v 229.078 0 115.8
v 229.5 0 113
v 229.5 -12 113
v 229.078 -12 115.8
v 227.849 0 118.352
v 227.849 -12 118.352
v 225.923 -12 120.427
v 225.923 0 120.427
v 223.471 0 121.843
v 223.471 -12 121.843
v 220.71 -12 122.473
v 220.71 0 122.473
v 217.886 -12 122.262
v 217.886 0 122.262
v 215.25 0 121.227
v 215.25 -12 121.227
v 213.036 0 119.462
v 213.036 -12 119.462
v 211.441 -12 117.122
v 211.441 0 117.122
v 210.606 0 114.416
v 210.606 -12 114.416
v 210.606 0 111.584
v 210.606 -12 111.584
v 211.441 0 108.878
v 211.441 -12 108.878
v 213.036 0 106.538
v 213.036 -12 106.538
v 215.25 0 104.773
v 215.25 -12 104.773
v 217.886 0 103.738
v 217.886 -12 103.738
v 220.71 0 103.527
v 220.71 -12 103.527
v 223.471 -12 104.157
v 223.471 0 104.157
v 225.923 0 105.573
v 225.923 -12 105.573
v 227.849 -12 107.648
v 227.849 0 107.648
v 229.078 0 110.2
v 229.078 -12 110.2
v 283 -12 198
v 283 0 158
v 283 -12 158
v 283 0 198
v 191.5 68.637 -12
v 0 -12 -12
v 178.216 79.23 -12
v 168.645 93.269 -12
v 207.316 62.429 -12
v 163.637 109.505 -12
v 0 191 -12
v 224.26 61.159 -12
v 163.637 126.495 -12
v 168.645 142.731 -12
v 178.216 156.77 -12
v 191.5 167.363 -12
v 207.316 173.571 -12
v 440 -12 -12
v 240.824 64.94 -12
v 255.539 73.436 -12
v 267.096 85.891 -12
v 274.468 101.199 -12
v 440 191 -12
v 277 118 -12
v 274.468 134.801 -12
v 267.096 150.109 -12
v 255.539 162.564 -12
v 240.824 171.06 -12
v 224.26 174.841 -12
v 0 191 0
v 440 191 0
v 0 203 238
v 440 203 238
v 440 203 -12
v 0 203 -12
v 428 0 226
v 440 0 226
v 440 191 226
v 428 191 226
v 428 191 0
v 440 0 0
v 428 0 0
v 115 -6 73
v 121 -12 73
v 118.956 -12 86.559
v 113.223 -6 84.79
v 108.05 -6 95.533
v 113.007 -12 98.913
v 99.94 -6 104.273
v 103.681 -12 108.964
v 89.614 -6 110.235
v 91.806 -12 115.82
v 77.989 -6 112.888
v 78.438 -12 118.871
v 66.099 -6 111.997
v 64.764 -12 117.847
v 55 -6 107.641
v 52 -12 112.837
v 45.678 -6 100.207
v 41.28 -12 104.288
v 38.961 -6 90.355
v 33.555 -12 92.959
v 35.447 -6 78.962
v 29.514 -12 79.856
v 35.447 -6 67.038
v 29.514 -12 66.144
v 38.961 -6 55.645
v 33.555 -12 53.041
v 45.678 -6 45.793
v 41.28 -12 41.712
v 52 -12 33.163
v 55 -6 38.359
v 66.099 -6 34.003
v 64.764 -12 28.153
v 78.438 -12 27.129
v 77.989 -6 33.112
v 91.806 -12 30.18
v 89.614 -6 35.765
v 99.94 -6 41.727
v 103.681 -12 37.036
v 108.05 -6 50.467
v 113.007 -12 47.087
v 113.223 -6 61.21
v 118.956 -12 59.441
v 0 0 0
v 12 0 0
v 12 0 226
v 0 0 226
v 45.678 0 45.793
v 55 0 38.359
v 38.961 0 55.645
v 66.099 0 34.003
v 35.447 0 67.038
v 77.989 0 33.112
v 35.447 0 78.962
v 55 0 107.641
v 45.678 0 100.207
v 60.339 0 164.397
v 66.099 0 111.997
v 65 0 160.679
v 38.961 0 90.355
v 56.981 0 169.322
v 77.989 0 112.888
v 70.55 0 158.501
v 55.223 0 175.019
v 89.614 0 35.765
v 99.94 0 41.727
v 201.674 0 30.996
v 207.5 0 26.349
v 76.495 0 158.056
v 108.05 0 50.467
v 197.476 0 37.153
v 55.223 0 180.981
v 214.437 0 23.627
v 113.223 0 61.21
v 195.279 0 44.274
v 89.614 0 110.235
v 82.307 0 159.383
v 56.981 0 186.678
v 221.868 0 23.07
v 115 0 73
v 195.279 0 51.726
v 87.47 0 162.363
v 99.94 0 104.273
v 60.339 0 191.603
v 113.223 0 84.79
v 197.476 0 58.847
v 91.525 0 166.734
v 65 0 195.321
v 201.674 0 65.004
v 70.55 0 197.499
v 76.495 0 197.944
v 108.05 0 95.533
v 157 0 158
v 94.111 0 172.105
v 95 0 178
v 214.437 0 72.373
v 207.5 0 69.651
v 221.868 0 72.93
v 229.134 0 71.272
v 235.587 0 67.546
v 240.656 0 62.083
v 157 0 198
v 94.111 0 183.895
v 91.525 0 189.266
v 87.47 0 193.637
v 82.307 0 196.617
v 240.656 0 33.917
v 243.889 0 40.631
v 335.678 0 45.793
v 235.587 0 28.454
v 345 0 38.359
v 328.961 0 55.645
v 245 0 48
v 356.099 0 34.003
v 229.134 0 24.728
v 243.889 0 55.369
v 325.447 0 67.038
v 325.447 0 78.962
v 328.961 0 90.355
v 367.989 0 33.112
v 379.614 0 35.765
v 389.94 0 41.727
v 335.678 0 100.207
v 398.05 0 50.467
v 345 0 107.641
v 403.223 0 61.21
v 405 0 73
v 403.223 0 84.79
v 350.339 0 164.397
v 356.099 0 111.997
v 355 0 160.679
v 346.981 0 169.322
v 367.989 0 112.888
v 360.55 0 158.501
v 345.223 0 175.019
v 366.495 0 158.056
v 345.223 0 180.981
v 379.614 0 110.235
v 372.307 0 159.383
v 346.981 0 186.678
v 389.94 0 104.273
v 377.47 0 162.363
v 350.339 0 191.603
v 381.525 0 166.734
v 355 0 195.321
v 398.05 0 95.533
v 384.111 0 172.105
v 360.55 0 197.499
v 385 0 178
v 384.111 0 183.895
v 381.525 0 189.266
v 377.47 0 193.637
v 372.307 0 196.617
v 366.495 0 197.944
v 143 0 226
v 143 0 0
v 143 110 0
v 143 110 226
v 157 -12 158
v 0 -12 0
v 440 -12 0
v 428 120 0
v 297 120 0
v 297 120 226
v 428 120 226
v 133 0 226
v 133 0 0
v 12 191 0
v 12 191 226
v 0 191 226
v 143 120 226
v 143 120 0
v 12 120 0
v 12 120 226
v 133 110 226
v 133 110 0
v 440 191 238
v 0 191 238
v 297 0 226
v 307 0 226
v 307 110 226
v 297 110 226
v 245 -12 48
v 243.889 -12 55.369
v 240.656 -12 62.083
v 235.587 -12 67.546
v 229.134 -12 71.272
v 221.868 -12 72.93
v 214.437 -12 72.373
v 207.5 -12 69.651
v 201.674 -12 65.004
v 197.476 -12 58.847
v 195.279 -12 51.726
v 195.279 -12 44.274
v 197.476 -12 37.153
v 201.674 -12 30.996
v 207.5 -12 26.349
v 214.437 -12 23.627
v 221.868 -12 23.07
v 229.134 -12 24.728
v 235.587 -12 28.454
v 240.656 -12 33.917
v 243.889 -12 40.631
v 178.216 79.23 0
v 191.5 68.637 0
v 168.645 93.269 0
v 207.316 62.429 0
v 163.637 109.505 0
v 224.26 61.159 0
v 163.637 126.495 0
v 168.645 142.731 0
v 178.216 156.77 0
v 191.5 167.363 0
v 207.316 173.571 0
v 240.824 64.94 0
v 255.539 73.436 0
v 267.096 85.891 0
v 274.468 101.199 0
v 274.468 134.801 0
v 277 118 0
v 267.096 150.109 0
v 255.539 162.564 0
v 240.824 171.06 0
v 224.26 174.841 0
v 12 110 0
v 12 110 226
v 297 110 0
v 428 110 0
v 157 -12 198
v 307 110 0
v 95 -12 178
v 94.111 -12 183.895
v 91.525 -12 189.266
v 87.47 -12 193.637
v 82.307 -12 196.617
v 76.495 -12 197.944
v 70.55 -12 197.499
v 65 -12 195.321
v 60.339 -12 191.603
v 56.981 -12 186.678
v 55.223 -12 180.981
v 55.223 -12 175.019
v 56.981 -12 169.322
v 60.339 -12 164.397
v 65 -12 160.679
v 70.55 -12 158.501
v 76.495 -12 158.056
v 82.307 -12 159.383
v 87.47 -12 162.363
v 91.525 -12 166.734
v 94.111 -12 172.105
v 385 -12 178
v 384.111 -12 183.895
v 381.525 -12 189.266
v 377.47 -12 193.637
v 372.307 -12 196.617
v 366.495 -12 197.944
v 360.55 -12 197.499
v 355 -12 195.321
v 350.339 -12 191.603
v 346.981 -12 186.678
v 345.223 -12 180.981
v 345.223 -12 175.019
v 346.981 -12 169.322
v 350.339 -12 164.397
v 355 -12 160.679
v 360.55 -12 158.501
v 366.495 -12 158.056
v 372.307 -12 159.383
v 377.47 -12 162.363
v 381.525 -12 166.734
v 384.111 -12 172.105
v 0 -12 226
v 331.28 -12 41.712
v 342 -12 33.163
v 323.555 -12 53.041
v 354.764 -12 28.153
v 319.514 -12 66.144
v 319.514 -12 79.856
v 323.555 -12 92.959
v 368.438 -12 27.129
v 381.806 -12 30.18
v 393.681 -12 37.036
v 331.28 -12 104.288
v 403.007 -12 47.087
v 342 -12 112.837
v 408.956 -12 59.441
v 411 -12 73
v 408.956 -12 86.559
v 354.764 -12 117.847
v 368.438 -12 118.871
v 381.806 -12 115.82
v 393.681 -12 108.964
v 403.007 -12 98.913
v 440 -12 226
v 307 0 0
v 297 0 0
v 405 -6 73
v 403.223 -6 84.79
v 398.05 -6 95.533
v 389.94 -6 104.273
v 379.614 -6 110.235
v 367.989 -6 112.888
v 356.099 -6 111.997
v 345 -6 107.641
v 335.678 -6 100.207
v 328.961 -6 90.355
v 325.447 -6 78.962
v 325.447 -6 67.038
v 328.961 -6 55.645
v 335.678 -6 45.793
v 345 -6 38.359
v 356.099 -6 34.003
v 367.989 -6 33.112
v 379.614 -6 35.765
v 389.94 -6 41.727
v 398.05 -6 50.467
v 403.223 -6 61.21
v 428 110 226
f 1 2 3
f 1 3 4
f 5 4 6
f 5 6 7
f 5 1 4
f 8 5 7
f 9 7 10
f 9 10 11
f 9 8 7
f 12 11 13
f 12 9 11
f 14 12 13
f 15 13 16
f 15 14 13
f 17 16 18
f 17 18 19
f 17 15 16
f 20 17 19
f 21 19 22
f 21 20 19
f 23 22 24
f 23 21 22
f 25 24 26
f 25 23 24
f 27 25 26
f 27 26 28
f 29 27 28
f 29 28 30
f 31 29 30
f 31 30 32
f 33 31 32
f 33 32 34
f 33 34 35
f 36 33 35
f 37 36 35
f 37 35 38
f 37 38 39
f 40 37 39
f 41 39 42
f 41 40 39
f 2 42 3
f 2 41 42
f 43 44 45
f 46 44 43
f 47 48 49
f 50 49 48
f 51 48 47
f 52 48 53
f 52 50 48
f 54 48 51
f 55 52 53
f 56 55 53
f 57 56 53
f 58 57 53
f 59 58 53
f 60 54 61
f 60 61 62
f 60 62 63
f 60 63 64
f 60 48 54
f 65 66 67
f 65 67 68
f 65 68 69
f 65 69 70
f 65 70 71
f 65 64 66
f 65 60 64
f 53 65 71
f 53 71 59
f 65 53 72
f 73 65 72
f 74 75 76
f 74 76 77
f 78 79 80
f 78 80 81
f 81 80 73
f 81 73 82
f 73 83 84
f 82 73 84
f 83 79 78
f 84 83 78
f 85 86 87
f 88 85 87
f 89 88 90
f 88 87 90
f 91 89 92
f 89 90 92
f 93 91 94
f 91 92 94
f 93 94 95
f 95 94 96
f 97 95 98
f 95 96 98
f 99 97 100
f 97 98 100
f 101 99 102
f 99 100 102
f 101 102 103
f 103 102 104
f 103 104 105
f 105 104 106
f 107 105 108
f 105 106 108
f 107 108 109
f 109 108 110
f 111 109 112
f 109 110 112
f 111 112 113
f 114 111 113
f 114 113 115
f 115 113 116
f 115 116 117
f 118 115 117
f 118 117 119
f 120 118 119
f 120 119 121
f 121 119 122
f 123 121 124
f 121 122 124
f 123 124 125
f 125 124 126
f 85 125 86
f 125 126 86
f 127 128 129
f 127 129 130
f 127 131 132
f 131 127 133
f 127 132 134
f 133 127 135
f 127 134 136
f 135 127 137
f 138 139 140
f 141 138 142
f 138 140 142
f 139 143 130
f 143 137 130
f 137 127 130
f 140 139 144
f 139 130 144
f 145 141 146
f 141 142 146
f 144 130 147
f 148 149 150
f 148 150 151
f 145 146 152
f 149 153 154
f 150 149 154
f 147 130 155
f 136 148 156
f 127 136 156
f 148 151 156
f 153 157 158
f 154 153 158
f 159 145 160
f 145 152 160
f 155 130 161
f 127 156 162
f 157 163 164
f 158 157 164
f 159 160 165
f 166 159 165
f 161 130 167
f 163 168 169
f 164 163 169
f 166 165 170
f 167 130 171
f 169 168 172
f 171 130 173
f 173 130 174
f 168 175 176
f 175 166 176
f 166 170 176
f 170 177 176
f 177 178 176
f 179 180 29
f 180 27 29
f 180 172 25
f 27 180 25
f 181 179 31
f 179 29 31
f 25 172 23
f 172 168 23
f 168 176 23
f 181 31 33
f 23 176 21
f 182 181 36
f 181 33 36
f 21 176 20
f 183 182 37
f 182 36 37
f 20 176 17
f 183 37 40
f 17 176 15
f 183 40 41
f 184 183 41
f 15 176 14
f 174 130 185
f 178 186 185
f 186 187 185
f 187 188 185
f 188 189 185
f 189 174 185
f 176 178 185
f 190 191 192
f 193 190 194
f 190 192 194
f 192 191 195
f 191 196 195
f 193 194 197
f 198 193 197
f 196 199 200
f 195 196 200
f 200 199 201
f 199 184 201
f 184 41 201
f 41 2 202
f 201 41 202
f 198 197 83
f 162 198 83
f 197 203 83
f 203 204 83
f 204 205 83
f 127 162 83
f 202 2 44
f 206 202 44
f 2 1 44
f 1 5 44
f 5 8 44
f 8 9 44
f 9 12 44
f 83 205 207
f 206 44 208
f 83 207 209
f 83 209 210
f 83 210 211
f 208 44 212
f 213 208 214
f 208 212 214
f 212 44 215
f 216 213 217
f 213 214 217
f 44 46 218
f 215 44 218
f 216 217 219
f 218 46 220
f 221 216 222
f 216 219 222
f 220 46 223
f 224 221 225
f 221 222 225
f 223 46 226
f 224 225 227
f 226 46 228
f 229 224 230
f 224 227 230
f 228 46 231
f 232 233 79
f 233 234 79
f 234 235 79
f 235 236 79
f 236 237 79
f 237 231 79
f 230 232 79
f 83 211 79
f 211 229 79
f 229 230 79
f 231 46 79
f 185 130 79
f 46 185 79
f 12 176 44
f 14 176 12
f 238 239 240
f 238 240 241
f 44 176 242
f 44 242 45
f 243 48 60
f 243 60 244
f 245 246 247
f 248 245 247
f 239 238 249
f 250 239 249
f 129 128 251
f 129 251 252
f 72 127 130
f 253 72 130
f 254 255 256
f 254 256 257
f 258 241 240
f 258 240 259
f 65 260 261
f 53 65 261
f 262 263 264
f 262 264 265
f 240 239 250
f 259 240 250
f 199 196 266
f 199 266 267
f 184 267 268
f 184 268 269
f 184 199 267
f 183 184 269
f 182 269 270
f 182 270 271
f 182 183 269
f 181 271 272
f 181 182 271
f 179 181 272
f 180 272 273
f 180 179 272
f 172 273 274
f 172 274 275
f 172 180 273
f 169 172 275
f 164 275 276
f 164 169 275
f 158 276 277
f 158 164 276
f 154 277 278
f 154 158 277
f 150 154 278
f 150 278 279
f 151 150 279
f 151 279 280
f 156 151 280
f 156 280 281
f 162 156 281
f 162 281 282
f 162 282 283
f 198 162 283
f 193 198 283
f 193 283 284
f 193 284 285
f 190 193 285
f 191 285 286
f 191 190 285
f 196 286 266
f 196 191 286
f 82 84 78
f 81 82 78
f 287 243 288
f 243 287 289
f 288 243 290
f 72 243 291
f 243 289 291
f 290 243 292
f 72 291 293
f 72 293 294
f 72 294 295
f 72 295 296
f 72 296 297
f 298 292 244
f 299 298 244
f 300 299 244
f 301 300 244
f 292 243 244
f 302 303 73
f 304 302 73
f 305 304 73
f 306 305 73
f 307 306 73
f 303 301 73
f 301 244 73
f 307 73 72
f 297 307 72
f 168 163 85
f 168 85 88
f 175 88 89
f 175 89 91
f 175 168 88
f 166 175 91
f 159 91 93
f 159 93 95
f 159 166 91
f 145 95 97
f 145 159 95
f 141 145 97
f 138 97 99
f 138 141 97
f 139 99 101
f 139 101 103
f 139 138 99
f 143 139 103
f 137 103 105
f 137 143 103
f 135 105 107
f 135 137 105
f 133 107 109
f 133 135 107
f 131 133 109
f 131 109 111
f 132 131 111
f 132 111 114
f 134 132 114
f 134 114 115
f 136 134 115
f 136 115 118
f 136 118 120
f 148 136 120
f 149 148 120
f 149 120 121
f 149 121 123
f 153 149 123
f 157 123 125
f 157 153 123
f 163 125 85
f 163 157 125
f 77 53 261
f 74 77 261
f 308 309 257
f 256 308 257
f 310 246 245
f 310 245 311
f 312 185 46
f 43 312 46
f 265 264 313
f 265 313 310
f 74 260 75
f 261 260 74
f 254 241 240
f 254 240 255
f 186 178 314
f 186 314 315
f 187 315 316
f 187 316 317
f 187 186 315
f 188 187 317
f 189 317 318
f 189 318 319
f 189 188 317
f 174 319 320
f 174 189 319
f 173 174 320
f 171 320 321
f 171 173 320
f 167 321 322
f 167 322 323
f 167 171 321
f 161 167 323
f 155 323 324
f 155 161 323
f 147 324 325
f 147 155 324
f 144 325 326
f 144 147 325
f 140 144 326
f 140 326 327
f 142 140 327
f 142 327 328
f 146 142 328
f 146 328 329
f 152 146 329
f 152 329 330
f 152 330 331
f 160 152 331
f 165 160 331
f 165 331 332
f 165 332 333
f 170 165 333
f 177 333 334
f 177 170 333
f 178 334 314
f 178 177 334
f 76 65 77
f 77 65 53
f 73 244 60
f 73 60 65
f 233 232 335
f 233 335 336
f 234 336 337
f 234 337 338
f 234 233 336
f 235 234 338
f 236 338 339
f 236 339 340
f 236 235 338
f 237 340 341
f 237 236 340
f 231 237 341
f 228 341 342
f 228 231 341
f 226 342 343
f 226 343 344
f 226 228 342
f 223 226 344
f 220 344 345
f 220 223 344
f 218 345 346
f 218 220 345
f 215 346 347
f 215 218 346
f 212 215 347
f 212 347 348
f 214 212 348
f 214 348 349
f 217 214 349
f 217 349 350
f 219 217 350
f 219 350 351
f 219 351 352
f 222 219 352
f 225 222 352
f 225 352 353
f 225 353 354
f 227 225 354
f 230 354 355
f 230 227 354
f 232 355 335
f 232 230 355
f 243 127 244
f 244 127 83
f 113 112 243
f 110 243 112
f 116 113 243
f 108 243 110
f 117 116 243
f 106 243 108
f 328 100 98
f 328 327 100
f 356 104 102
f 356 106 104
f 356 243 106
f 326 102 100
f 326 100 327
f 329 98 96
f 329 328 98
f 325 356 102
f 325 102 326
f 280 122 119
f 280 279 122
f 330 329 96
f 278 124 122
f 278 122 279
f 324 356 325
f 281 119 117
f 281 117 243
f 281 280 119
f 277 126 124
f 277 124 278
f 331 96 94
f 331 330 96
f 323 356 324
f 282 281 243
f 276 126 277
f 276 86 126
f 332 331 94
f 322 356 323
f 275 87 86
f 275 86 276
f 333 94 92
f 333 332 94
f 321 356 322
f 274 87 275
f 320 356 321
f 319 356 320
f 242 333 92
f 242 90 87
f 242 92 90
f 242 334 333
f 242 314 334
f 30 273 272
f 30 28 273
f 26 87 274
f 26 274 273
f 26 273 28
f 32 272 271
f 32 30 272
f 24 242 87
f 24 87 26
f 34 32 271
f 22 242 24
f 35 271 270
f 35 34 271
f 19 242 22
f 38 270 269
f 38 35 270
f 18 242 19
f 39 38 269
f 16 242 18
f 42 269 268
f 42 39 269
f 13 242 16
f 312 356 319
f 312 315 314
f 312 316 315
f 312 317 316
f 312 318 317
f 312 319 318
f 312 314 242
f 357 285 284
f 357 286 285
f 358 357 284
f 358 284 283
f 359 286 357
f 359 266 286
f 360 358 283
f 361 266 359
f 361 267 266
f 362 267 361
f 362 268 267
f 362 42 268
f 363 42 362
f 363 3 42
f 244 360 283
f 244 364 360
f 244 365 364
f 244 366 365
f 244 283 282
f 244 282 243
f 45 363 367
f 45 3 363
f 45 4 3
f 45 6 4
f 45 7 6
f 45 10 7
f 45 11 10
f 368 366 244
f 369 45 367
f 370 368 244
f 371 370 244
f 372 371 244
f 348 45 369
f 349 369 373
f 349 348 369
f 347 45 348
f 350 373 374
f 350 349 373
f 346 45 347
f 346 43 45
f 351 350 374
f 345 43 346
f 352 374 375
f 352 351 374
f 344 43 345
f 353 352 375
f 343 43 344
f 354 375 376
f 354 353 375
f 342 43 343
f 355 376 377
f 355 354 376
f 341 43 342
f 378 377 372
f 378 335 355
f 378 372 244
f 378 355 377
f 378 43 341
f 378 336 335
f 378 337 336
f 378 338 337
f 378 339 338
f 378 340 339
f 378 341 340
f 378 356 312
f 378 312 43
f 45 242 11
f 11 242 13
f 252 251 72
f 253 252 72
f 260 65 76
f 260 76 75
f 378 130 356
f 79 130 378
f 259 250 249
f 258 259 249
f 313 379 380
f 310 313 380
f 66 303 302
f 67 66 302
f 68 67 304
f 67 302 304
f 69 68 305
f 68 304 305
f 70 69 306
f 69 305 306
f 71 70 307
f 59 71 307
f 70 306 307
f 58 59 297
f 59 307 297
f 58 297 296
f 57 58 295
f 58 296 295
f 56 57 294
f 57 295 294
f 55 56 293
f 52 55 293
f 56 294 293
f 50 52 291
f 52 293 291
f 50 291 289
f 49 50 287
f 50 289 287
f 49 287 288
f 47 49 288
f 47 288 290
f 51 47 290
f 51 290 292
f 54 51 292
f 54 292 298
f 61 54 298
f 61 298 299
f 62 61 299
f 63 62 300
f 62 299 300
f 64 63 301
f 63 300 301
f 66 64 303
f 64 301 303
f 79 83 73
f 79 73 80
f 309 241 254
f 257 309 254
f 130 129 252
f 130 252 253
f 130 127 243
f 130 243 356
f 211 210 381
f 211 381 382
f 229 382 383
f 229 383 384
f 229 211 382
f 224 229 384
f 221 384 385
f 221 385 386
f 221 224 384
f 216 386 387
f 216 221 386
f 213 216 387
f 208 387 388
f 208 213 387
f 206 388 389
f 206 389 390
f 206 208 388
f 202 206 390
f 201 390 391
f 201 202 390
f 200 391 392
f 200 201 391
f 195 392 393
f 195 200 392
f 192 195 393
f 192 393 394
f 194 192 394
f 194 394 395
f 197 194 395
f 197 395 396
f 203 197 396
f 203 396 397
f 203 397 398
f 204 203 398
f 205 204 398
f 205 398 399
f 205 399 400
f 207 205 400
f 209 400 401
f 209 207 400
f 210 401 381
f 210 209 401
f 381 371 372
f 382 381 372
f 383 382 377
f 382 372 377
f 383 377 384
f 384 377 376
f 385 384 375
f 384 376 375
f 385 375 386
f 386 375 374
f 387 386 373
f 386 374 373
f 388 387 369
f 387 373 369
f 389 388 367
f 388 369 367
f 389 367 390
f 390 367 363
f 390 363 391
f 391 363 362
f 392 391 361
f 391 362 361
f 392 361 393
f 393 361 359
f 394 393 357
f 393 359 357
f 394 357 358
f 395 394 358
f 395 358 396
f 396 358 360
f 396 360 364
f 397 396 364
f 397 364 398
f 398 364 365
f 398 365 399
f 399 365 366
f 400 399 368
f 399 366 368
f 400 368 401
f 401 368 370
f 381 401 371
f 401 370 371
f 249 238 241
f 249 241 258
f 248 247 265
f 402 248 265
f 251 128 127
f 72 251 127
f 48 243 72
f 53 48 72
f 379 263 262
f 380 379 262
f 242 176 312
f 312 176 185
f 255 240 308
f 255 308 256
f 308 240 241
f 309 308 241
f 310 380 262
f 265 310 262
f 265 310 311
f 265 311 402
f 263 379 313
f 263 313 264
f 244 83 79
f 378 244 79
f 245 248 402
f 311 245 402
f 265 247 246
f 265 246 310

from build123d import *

# Parameters (mm, degrees)
F0_W      = 440
F0_H      = 226
F0_R      = 40
F0_R_2    = 25
F0_R_3    = 20
F0_R_4    = 9.5
F0_W_2    = 126
F0_H_2    = 40
F1_DEPTH  = 12
F2_W      = 12
F2_H      = 226
F3_DEPTH  = 191
F4_W      = 10
F4_H      = 226
F5_DEPTH  = 110
F6_W      = 10
F6_H      = 226
F7_DEPTH  = 131
F8_W      = 10
F8_H      = 226
F9_DEPTH  = 131
F10_W     = 203
F10_H     = 12
F11_DEPTH = 440
F12_W     = 440
F12_H     = 250
F13_DEPTH = 12
F14_R     = 57
F15_DEPTH = 12
F16_SIZE  = 6


with BuildPart() as f1:
    # F0 (on Front) → F1 (new body)
    with BuildSketch(Plane.XZ):
        with Locations((220, 113)):
            Rectangle(F0_W, F0_H)
        with Locations((75, 73)):
            Circle(F0_R, mode=Mode.SUBTRACT)
        with Locations((220, 48)):
            Circle(F0_R_2, mode=Mode.SUBTRACT)
        with Locations((365, 73)):
            Circle(F0_R, mode=Mode.SUBTRACT)
        with Locations((75, 178)):
            Circle(F0_R_3, mode=Mode.SUBTRACT)
        with Locations((220, 113)):
            Circle(F0_R_4, mode=Mode.SUBTRACT)
        with Locations((220, 178)):
            Rectangle(F0_W_2, F0_H_2, mode=Mode.SUBTRACT)
        with Locations((365, 178)):
            Circle(F0_R_3, mode=Mode.SUBTRACT)
    extrude(amount=F1_DEPTH)

    # F16
    f16_edges = [f1.edges().sort_by_distance(p)[0] for p in [
        (325, -12, 73),
        (35, -12, 73),
    ]]
    chamfer(f16_edges, length=F16_SIZE)


with BuildPart() as f3:
    # F2 (on face) → F3 (new body)
    with BuildSketch(Plane(origin=(0, 0, 0), x_dir=(-1, 0, 0), z_dir=(0, 1, 0))):
        with Locations((-434, 113)):
            Rectangle(F2_W, F2_H)
        with Locations((-6, 113)):
            Rectangle(F2_W, F2_H)
    extrude(amount=F3_DEPTH)


with BuildPart() as f5:
    # F4 (on face) → F5 (new body)
    with BuildSketch(Plane(origin=(0, 0, 0), x_dir=(-1, 0, 0), z_dir=(0, 1, 0))):
        with Locations((-302, 113)):
            Rectangle(F4_W, F4_H)
        with Locations((-138, 113)):
            Rectangle(F4_W, F4_H)
    extrude(amount=F5_DEPTH)


with BuildPart() as f7:
    # F6 (on face) → F7 (new body, through all)
    with BuildSketch(Plane(origin=(297, 0, 0), x_dir=(0, -1, 0), z_dir=(-1, 0, 0))):
        with Locations((-115, 113)):
            Rectangle(F6_W, F6_H)
    extrude(amount=-F7_DEPTH)


with BuildPart() as f9:
    # F8 (on face) → F9 (new body, through all)
    with BuildSketch(Plane.YZ.offset(143)):
        with Locations((115, 113)):
            Rectangle(F8_W, F8_H)
    extrude(amount=-F9_DEPTH)


with BuildPart() as f11:
    # F10 (on face) → F11 (new body)
    with BuildSketch(Plane.YZ.offset(440)):
        with Locations((89.5, -6)):
            Rectangle(F10_W, F10_H)
    extrude(amount=-F11_DEPTH)

    # F14 (on face) → F15 (cut)
    with BuildSketch(Plane.XY):
        with Locations((220, 118)):
            Circle(F14_R)
    extrude(amount=-F15_DEPTH, mode=Mode.SUBTRACT)


with BuildPart() as f13:
    # F12 (on face) → F13 (new body)
    with BuildSketch(Plane(origin=(0, 191, 0), x_dir=(-1, 0, 0), z_dir=(0, 1, 0))):
        with Locations((-220, 113)):
            Rectangle(F12_W, F12_H)
    extrude(amount=F13_DEPTH)


solid = Compound([f1.part, f3.part, f5.part, f7.part, f9.part, f11.part, f13.part])
